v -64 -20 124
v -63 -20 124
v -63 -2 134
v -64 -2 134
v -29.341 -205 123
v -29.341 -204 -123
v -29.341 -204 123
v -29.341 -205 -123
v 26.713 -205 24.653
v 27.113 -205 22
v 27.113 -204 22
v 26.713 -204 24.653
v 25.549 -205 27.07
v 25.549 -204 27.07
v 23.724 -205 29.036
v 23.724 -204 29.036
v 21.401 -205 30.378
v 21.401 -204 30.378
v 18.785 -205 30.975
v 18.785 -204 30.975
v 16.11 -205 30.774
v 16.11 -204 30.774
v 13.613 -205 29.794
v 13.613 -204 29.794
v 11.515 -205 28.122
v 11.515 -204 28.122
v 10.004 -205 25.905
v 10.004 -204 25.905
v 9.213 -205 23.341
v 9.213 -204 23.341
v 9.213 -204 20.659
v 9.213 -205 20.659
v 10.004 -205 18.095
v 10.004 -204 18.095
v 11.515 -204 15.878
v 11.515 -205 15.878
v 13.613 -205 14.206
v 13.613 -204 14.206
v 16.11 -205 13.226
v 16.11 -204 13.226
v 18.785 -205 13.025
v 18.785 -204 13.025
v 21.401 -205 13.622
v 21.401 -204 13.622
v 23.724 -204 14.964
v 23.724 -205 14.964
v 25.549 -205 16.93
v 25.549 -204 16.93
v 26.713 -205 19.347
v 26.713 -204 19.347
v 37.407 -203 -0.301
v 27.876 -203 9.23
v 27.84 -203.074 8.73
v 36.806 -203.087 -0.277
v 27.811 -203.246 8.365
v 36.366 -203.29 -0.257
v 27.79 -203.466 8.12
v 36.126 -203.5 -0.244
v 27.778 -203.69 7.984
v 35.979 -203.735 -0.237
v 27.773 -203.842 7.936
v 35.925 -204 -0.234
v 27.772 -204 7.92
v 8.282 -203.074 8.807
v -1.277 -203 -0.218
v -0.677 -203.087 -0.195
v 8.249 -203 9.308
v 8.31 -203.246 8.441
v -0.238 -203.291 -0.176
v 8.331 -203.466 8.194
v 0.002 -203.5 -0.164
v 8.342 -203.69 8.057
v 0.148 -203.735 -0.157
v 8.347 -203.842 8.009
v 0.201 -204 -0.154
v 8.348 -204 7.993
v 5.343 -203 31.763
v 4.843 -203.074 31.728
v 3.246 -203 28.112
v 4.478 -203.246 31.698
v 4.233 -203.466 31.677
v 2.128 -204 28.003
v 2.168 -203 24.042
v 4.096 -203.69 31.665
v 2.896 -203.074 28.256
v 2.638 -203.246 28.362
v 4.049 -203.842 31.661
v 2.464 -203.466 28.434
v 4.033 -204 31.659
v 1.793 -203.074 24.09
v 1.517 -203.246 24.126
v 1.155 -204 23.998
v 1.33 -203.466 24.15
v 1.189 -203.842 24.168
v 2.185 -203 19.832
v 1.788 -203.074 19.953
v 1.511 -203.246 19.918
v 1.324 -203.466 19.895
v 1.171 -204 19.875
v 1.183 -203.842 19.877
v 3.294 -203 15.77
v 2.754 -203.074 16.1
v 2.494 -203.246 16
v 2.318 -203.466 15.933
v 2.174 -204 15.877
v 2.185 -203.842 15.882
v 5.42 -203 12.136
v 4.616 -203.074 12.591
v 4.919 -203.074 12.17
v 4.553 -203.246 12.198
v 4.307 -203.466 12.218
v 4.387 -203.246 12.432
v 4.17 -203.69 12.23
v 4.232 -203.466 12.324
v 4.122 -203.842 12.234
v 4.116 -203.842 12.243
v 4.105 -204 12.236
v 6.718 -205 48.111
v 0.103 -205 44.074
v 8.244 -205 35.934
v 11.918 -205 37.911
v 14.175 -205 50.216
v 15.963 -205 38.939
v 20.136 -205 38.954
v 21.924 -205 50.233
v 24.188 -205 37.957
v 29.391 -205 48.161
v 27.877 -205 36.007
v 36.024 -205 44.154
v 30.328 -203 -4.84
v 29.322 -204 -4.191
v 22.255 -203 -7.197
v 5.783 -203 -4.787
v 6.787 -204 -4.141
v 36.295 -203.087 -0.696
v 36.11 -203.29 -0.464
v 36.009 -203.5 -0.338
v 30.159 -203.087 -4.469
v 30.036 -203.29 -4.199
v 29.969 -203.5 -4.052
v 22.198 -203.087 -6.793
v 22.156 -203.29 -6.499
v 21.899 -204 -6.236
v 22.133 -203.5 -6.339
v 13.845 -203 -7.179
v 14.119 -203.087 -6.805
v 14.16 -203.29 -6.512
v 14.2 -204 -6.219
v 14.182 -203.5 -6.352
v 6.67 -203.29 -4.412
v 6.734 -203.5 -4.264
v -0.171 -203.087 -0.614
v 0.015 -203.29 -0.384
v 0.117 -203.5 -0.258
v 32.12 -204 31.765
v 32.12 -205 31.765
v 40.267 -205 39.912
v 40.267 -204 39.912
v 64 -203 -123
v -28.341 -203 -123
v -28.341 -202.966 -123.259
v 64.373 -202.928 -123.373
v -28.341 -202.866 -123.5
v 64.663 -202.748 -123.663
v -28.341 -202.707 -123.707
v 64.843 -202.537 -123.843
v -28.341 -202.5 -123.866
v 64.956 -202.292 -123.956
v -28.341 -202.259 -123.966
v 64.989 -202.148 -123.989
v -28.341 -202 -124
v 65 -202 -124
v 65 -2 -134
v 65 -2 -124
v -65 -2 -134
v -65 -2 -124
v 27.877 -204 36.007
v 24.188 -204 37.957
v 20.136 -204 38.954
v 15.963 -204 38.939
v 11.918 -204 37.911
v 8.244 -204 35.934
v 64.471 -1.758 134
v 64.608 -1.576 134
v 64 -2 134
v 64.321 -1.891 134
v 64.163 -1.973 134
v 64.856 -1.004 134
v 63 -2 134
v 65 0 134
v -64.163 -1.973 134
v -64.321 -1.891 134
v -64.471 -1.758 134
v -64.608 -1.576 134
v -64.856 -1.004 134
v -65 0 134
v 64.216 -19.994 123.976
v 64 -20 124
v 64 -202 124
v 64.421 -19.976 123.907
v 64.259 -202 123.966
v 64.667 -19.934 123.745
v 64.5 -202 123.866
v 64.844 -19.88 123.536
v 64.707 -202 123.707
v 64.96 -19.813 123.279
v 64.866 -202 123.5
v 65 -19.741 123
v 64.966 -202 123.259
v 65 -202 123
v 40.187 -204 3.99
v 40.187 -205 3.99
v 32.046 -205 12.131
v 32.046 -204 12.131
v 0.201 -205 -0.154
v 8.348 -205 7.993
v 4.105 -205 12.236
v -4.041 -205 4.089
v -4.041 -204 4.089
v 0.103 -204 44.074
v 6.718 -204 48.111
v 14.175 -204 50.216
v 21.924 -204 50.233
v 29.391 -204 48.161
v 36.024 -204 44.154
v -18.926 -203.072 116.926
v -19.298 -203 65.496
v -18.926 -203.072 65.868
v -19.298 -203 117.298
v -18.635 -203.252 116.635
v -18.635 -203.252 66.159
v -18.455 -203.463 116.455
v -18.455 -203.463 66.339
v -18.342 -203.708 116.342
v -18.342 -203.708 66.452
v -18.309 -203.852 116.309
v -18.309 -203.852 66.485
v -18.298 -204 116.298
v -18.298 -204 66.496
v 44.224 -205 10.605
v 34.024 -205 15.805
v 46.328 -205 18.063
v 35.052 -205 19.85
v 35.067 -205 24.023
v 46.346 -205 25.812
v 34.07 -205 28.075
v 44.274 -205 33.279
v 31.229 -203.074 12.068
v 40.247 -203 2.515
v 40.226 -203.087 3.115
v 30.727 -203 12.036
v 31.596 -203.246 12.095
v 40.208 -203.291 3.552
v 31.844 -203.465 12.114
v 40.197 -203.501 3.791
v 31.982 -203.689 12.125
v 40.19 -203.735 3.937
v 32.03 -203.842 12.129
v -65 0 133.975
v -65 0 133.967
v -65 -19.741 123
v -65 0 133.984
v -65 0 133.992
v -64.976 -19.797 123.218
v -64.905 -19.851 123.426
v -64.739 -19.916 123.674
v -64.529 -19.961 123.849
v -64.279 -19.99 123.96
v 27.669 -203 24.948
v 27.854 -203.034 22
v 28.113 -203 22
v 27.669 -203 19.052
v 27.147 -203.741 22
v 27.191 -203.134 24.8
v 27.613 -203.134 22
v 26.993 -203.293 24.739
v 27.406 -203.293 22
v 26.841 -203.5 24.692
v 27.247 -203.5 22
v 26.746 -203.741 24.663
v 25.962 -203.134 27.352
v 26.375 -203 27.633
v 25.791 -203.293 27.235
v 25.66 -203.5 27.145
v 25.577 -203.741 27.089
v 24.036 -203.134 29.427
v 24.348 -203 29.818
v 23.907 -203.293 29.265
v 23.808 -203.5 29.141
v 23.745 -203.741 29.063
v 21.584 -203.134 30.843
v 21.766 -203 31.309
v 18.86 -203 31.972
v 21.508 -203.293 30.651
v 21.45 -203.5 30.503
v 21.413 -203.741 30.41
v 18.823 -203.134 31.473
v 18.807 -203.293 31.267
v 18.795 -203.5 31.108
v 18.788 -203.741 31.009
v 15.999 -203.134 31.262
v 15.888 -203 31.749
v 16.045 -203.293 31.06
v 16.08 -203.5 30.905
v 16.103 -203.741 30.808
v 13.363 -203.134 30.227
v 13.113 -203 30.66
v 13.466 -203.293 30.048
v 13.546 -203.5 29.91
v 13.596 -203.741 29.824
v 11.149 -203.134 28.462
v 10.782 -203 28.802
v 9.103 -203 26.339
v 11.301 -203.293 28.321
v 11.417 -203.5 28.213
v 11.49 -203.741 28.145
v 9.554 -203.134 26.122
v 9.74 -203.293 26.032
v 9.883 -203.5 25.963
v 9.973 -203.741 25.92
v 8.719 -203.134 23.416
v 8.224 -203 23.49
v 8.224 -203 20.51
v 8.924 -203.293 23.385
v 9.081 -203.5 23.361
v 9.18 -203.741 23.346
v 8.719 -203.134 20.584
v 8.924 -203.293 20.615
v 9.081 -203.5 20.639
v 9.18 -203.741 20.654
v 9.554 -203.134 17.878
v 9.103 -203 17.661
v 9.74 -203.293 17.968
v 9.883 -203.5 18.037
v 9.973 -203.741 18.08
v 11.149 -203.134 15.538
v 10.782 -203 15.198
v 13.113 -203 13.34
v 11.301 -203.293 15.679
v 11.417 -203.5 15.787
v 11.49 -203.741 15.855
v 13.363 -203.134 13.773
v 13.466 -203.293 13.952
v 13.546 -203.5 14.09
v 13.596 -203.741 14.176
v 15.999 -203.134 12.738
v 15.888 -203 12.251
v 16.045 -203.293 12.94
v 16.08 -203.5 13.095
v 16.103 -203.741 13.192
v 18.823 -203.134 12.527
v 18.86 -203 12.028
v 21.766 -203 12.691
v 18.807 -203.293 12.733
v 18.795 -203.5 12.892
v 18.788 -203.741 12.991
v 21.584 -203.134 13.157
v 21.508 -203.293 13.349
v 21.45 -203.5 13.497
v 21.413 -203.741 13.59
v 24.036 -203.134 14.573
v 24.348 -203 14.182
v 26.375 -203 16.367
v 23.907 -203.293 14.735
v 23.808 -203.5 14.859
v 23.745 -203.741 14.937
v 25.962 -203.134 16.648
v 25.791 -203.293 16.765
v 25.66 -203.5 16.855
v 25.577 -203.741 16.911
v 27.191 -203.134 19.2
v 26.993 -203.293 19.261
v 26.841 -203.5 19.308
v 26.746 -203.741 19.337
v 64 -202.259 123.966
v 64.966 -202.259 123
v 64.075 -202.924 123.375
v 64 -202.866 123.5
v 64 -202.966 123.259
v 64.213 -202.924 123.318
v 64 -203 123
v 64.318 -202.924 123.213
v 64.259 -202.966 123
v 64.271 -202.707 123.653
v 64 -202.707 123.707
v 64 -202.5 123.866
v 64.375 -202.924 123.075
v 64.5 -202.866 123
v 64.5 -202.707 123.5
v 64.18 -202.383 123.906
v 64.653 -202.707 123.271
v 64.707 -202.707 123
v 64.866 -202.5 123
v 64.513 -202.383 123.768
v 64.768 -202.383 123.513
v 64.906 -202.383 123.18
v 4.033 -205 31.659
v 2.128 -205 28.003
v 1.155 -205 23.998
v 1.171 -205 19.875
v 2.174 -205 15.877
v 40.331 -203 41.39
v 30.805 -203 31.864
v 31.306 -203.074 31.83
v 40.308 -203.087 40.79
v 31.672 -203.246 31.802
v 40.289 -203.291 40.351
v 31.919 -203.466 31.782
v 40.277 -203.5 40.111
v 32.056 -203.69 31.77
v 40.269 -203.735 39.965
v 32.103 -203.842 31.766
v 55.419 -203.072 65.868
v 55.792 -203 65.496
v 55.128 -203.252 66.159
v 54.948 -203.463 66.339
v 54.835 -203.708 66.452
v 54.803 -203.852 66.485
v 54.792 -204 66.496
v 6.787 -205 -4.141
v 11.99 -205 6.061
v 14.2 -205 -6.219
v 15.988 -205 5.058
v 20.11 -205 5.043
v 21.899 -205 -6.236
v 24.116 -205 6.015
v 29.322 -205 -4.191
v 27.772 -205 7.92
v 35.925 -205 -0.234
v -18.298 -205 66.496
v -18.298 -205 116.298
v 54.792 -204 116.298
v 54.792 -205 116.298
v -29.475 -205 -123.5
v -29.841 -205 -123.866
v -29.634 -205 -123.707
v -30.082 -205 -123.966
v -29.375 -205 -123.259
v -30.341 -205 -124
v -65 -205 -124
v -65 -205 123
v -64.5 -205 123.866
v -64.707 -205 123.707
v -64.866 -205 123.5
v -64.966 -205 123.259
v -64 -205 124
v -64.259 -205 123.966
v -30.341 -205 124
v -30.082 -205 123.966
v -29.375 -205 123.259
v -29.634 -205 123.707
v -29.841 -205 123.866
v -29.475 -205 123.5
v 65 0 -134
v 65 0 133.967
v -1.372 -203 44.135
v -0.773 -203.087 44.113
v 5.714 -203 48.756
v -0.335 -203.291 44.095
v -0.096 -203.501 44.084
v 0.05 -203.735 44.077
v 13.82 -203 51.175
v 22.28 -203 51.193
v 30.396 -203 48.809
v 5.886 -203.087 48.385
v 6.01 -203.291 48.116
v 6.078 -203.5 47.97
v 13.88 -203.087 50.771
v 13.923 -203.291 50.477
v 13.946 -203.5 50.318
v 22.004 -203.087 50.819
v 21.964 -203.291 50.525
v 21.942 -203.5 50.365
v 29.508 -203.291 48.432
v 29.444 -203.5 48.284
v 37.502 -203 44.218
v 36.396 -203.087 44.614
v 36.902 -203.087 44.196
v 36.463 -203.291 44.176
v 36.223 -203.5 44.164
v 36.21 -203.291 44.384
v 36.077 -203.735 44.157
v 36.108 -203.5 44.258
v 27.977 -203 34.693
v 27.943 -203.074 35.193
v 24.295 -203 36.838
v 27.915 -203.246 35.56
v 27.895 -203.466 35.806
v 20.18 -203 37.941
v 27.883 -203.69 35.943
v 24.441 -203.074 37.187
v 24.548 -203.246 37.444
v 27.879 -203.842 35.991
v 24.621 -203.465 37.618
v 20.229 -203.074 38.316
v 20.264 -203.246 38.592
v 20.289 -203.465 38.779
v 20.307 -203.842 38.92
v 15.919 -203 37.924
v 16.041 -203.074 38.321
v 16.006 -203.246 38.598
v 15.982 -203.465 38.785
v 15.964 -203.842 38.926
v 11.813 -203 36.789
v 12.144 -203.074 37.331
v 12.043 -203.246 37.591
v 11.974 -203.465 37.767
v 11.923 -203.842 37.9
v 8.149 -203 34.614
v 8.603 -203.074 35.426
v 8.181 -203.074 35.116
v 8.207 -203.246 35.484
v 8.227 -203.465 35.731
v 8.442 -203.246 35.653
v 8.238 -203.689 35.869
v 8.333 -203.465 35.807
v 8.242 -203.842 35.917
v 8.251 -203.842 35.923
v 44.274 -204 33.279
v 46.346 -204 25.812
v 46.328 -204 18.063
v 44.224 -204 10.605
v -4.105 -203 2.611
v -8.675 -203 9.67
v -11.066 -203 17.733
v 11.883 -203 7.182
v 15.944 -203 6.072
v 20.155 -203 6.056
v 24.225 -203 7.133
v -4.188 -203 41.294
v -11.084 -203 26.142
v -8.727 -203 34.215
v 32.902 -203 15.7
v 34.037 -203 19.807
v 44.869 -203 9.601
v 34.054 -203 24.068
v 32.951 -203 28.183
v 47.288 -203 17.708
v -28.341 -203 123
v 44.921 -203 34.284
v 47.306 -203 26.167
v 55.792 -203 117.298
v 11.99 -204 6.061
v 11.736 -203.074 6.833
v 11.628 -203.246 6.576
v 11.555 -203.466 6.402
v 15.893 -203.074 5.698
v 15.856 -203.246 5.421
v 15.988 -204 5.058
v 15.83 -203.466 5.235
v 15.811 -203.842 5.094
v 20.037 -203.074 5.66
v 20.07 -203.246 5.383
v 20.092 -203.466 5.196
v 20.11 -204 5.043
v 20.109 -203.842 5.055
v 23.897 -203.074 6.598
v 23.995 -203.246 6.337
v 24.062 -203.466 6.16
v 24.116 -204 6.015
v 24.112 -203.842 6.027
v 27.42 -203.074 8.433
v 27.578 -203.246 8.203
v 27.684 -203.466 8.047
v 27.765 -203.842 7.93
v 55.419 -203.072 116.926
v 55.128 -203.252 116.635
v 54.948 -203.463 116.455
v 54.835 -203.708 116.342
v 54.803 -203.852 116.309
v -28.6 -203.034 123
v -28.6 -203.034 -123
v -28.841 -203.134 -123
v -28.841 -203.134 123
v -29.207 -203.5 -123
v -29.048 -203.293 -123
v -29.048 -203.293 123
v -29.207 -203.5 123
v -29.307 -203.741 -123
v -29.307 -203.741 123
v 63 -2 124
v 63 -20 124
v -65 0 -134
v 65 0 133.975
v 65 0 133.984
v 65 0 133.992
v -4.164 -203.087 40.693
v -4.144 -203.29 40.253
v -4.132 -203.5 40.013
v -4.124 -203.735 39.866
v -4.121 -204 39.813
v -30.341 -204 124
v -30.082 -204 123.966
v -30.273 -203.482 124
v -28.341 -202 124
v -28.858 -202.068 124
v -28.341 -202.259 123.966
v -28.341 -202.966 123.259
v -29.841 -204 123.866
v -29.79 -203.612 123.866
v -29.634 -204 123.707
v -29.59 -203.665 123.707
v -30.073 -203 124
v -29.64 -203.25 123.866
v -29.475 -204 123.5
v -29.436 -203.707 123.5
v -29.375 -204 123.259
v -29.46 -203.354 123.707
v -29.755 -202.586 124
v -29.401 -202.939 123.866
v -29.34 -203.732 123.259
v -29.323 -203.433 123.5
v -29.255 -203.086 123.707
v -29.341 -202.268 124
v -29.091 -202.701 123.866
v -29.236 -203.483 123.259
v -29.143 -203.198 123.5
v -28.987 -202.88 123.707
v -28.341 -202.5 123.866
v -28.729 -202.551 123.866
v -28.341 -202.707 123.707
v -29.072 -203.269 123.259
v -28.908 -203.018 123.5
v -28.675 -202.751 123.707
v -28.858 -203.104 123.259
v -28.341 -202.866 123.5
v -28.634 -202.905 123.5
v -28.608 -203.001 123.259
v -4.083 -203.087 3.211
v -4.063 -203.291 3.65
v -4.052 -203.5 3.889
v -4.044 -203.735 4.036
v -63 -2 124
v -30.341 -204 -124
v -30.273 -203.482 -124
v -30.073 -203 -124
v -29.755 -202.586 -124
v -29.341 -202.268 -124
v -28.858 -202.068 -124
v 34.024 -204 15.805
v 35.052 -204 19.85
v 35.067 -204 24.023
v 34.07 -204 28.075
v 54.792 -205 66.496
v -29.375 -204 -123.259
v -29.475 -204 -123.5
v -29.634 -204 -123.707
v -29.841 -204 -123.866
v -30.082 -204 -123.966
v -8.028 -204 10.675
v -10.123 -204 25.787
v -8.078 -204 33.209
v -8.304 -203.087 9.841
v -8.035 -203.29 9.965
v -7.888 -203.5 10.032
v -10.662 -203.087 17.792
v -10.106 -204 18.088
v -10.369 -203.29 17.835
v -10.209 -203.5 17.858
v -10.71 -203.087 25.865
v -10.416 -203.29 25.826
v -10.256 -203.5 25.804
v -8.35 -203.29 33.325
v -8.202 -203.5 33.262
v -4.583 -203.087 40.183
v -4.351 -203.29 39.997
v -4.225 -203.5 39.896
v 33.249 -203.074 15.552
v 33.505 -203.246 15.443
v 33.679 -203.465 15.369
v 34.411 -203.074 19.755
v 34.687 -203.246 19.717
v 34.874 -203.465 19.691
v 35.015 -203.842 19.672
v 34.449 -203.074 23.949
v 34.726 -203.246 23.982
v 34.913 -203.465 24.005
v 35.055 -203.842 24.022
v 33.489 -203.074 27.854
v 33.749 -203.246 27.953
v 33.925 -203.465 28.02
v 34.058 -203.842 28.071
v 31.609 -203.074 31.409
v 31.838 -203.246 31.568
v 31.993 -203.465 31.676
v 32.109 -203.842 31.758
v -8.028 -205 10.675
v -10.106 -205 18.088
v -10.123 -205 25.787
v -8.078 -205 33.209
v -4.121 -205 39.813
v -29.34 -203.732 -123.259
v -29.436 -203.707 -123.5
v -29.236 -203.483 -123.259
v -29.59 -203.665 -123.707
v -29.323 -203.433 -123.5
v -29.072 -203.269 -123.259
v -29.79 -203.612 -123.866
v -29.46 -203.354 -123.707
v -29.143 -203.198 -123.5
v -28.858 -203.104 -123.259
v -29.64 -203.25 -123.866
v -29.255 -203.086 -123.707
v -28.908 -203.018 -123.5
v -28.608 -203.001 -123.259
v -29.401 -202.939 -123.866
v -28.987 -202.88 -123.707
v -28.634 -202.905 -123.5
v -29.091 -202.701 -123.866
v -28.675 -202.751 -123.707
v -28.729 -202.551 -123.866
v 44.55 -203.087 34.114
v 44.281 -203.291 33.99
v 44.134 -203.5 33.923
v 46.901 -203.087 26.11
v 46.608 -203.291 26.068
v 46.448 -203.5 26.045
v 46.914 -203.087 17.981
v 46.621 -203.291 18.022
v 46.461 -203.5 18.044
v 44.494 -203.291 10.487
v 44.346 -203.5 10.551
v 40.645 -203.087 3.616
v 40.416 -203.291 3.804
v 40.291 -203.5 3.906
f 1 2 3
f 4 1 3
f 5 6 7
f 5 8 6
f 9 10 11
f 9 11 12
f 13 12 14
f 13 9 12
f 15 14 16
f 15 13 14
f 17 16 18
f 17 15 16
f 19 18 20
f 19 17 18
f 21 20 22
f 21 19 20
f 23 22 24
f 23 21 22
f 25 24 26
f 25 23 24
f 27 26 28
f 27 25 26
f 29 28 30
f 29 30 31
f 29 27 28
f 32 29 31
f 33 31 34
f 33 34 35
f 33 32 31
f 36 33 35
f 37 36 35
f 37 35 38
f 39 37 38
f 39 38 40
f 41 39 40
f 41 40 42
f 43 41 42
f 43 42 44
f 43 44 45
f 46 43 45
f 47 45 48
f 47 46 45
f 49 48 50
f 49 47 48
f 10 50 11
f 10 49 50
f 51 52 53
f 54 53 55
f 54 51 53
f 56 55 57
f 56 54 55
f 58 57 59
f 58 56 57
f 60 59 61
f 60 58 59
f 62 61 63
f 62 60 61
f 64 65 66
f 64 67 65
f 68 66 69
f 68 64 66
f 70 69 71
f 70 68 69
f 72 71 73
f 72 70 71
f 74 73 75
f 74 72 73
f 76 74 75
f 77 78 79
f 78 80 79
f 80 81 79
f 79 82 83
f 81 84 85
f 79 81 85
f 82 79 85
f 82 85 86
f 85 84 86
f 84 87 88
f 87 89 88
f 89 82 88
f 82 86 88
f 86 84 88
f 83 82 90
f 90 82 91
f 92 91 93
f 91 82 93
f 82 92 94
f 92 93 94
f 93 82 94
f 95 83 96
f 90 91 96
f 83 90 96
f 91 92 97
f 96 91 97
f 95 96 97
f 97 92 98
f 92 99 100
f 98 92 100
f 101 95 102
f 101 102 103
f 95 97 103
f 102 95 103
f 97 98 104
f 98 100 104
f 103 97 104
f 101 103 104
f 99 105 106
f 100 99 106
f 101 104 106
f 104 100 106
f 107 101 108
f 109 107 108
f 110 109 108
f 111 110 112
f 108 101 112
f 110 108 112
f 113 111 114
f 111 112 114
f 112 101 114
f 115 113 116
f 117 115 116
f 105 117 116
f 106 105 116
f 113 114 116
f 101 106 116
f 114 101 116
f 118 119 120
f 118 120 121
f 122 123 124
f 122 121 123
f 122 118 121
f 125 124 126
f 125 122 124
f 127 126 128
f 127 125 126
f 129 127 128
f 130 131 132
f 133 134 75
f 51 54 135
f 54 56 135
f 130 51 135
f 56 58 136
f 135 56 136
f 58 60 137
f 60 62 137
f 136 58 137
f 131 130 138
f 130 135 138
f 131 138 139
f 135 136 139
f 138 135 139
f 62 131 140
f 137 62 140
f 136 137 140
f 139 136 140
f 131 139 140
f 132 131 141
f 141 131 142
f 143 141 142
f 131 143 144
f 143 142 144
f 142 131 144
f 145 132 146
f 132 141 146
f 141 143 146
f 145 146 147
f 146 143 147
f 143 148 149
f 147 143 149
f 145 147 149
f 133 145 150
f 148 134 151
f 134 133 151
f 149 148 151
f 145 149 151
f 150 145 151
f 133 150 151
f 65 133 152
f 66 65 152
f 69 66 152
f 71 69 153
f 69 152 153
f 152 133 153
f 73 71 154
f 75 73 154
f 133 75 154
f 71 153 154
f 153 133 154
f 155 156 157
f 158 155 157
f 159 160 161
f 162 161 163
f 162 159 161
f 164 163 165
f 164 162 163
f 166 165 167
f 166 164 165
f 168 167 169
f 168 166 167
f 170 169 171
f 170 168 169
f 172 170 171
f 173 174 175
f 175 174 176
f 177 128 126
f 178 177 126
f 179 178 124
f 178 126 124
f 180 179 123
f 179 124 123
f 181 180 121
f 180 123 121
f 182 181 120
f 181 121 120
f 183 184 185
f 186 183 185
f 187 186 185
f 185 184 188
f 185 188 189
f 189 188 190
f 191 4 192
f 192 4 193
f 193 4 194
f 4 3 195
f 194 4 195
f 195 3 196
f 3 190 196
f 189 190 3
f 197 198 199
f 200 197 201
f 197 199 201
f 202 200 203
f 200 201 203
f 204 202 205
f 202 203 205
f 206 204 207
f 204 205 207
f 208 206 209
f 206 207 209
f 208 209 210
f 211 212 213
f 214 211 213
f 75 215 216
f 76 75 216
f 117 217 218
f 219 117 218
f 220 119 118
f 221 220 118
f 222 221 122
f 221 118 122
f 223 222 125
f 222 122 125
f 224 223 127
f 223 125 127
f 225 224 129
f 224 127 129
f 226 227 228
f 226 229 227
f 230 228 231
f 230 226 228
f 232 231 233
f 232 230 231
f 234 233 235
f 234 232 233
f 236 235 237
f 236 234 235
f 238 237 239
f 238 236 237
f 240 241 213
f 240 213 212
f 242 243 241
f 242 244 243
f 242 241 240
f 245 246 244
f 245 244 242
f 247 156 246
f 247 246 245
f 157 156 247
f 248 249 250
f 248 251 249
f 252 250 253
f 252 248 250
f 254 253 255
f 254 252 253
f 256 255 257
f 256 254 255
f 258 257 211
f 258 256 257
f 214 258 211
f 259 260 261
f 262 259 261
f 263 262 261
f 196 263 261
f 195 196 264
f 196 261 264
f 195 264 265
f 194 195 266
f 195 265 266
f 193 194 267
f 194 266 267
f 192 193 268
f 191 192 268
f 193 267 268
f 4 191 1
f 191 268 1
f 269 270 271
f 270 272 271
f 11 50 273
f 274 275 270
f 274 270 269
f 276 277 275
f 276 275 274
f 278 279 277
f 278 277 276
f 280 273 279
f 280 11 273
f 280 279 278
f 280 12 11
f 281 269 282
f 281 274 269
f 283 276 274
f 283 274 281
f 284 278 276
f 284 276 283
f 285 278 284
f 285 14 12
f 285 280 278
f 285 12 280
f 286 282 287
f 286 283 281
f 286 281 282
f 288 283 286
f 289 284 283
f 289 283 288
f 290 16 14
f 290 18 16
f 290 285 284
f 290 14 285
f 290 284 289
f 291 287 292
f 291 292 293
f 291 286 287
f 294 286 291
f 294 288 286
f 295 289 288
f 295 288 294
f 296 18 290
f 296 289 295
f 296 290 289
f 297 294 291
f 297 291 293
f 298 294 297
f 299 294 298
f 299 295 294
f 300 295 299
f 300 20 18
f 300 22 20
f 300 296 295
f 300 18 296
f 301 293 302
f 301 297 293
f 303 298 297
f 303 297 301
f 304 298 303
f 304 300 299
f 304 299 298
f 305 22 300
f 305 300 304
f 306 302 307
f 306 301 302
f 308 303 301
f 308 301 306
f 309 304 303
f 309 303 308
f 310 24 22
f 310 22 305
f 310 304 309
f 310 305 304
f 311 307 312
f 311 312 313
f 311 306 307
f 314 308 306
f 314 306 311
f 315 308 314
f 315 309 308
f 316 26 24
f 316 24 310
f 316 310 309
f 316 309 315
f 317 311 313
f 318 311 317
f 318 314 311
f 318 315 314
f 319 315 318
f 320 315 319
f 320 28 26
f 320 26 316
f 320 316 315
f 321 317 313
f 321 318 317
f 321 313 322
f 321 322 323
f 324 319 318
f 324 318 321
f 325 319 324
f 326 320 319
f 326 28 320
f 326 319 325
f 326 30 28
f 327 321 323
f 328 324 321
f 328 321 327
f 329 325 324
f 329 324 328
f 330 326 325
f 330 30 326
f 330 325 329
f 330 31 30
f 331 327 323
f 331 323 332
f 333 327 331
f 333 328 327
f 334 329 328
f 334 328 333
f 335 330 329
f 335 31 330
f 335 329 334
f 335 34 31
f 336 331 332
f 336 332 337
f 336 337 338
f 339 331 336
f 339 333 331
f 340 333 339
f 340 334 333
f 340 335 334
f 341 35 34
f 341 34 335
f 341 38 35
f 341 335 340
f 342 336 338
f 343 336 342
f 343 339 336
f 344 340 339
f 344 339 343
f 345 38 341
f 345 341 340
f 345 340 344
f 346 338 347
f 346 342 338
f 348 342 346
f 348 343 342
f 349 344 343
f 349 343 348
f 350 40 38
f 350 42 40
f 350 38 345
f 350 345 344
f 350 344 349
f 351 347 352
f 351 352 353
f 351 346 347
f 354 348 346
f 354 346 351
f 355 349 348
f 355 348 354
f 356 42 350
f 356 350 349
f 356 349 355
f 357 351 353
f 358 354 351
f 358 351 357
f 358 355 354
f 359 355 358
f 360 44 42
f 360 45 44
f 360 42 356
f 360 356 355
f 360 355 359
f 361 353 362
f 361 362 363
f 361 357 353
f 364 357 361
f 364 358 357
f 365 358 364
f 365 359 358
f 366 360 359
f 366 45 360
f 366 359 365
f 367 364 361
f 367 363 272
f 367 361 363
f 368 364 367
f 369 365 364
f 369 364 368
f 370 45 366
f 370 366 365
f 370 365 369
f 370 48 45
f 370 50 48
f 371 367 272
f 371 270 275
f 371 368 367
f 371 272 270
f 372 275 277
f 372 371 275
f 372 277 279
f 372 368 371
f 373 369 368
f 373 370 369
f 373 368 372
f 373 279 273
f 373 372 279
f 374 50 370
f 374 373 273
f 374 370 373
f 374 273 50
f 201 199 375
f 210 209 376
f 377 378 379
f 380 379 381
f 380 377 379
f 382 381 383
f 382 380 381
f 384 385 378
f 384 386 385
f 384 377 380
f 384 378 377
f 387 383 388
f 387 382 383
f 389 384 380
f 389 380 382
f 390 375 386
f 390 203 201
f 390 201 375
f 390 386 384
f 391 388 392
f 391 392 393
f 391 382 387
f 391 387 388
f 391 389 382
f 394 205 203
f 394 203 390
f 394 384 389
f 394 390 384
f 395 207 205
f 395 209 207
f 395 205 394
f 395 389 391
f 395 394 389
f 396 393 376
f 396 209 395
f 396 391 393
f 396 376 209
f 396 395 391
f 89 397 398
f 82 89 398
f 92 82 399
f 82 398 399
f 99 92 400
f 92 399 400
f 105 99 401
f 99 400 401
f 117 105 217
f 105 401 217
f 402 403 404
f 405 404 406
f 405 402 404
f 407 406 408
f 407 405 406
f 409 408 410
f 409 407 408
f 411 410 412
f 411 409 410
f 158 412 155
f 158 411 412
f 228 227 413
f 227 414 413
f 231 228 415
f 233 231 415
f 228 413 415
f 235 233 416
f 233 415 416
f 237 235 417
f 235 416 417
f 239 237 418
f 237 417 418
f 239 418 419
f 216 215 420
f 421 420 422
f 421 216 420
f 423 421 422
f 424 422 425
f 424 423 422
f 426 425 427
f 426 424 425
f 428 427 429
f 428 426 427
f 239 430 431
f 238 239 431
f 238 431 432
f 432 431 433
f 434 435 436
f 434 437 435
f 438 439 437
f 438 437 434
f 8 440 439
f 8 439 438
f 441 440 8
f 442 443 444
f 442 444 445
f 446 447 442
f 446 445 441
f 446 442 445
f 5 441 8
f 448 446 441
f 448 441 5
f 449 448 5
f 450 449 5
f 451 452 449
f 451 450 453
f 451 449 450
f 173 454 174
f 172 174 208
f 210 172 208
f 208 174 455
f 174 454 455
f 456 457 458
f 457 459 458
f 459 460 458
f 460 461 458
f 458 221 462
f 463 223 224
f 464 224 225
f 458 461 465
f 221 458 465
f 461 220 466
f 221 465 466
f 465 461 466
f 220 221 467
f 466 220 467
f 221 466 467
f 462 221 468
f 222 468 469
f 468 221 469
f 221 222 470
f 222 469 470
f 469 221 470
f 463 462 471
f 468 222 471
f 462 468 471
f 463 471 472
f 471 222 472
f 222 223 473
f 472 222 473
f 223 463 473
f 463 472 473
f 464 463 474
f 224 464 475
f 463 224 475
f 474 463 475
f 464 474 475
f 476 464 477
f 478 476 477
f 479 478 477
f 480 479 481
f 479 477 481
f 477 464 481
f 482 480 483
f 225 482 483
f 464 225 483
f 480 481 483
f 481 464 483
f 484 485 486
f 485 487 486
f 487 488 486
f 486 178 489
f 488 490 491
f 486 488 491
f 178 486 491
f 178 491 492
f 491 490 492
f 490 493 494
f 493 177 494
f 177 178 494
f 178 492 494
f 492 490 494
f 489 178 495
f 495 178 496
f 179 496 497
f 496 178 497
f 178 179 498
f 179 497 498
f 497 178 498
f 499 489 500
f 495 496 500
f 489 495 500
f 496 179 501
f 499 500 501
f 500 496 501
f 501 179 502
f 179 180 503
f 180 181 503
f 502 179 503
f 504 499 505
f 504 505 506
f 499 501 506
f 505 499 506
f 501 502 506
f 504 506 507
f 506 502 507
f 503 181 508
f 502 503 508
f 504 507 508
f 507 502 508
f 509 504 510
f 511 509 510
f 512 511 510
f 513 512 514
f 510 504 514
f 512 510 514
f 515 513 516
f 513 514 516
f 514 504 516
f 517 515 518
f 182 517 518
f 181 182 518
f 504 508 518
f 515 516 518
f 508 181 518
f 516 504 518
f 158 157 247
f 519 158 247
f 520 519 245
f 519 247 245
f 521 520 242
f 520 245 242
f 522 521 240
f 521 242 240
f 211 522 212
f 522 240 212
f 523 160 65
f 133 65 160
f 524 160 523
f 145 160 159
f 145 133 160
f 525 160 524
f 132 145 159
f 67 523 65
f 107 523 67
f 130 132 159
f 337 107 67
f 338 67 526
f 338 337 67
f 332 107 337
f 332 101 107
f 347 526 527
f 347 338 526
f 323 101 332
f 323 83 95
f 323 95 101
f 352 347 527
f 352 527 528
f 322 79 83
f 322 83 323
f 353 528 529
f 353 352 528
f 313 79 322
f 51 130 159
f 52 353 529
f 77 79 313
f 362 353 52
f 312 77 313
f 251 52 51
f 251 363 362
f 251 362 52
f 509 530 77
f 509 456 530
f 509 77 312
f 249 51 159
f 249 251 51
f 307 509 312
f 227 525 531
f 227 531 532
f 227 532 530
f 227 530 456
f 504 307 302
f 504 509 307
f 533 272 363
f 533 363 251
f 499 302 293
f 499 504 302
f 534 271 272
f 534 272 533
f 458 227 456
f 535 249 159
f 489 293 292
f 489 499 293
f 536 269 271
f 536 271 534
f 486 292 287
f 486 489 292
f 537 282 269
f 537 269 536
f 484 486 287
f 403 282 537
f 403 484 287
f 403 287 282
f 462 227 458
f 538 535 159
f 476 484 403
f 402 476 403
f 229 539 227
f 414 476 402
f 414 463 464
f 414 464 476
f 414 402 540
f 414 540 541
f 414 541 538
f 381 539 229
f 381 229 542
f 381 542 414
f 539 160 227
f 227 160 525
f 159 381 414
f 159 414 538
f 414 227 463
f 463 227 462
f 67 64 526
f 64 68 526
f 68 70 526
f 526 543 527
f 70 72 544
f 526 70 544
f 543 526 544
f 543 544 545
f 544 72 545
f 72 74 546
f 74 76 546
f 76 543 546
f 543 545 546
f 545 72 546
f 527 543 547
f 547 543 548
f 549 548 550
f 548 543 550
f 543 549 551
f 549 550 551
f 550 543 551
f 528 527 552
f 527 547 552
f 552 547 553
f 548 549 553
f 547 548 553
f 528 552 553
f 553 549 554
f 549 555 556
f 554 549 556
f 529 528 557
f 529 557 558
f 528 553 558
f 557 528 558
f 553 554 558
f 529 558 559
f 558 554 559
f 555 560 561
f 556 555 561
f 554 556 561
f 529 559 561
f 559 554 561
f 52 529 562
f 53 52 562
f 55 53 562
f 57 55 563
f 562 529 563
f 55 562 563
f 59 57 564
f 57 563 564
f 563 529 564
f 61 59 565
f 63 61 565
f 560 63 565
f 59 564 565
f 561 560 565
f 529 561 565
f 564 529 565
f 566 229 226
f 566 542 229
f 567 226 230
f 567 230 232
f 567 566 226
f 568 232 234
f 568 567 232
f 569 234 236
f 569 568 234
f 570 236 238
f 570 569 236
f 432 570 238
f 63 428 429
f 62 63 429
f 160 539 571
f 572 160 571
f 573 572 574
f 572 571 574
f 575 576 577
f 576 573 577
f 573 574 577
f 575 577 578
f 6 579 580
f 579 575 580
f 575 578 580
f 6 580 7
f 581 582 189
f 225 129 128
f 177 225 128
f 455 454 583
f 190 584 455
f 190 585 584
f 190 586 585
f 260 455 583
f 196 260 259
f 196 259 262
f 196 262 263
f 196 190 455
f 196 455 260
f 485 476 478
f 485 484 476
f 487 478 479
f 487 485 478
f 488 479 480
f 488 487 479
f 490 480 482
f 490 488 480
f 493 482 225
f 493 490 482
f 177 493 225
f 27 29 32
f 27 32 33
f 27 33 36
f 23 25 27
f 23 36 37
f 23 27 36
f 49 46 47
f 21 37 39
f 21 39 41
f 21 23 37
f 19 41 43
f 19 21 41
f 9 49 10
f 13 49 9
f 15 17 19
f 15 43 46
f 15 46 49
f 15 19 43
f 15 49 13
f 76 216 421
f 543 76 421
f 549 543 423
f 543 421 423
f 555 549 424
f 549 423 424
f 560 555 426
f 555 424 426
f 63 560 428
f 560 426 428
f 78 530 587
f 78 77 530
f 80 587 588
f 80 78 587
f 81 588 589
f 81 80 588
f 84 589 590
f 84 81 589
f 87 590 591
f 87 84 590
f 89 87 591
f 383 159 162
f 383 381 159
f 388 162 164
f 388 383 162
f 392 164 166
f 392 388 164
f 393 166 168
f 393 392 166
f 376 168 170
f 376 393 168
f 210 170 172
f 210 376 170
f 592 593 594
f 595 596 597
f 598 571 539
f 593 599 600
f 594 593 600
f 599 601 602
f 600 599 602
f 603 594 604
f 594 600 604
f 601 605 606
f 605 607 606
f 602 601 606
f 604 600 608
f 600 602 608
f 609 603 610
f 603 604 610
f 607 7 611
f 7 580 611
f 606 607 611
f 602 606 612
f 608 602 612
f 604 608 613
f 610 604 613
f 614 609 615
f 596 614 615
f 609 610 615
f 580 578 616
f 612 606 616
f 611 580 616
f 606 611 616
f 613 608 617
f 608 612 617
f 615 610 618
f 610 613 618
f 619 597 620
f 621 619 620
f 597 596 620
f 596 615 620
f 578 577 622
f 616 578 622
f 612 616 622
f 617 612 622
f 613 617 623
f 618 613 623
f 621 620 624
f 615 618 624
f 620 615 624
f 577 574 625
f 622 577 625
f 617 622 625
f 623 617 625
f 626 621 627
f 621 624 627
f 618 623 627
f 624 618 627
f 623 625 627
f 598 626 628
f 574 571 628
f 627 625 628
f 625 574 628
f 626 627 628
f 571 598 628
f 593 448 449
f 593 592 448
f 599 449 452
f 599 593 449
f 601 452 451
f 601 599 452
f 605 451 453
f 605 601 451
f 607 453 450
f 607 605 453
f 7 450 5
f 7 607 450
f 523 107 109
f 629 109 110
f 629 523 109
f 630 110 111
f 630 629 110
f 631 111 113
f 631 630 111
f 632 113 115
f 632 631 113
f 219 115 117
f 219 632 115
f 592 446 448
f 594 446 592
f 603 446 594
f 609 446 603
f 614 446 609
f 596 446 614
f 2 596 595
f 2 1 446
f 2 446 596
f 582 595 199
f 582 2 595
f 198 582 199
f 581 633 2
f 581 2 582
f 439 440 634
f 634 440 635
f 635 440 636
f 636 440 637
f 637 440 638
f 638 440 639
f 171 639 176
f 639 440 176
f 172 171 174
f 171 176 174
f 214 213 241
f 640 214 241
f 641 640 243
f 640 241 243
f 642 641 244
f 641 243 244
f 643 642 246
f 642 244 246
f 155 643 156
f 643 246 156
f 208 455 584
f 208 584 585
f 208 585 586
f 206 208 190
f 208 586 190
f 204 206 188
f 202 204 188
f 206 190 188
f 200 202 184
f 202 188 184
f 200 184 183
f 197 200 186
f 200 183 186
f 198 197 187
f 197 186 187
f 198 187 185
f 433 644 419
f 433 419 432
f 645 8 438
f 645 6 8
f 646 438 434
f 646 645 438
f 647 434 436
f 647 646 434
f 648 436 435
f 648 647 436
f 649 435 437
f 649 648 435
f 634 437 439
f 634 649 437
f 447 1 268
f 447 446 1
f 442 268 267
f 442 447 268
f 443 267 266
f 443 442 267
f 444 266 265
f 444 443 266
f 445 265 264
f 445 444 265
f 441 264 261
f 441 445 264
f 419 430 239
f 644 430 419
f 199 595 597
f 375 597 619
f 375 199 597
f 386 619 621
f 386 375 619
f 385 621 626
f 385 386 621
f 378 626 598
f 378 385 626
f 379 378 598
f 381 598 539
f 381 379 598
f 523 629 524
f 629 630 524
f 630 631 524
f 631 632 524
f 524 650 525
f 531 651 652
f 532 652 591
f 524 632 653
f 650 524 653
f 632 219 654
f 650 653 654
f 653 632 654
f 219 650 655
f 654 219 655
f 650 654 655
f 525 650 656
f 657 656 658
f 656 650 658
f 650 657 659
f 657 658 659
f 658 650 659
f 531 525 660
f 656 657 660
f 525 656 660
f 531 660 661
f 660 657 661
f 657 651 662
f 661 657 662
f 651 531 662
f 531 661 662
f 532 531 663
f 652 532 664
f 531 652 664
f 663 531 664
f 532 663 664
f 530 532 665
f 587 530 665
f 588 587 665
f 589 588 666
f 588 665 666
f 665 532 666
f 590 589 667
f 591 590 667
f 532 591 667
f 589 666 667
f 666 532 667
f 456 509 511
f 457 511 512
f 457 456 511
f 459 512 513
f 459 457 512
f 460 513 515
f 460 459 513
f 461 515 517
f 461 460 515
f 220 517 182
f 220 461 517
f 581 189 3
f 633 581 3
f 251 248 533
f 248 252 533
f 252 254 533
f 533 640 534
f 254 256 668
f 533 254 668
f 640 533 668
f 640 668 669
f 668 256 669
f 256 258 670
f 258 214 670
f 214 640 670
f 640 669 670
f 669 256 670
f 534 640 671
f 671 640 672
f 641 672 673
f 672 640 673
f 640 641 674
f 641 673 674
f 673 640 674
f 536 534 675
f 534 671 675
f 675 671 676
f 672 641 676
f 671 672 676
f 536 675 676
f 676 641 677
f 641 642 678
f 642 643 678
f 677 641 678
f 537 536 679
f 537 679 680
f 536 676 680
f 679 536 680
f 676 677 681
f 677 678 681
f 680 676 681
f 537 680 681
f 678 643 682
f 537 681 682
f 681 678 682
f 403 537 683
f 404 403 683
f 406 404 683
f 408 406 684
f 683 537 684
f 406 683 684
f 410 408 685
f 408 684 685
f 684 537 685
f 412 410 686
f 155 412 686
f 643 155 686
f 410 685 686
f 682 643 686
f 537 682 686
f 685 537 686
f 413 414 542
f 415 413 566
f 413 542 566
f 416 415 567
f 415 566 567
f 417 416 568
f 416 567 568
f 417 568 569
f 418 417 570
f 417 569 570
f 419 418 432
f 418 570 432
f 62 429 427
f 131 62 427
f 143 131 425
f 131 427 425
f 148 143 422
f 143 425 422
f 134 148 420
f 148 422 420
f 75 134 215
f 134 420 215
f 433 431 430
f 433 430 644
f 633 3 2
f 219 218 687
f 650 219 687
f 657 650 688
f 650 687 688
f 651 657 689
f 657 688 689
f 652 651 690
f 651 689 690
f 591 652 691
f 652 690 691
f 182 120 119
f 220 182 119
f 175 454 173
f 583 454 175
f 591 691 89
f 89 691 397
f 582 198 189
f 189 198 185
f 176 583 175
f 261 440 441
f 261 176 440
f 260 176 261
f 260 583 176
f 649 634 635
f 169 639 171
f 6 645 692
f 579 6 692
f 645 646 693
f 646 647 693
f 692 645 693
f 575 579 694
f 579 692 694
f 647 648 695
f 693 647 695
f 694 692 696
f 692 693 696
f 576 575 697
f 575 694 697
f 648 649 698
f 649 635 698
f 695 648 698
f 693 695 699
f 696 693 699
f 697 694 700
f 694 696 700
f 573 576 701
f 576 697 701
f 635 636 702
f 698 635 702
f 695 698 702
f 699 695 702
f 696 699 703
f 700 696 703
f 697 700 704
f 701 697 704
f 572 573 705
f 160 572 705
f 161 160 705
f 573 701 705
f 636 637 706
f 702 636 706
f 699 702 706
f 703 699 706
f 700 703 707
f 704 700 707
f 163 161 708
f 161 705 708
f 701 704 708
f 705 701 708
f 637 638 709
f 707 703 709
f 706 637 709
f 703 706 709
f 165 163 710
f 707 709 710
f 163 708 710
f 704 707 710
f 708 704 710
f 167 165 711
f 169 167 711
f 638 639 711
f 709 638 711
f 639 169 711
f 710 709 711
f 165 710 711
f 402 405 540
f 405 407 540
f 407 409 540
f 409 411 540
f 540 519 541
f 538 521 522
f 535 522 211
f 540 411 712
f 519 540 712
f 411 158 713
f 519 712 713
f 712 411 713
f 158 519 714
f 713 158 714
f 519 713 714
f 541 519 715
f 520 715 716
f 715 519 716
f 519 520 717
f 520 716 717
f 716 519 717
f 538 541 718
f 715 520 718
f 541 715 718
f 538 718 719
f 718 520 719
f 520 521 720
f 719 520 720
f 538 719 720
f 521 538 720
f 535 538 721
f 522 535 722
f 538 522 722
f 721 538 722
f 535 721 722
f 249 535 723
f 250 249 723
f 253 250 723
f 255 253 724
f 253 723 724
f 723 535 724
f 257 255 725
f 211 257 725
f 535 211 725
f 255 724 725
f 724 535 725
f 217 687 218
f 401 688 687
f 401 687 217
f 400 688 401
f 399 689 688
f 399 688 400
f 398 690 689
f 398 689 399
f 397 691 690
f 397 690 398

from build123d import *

# Parameters (mm, degrees)
F0_W      = 130
F0_H      = 248
F1_DEPTH  = 205
F2_W      = 94.3407235295
F2_H      = 248
F2_R      = 9
F2_W_2    = 73.0899348855
F2_H_2    = 49.802608788
F3_DEPTH  = 2
F4_W      = 130
F4_H      = 10
F5_DEPTH  = 20
F7_DEPTH  = 10
F9_DEPTH  = 130.001
F10_F1_R  = 1
F10_F2_R  = 1
F11_DEPTH = 18


with BuildPart() as f1:
    # F0 (on Front) → F1 (new body)
    with BuildSketch(Plane.XZ):
        Rectangle(F0_W, F0_H)
    extrude(amount=F1_DEPTH)

    # F2 (on face) → F3 (cut)
    with BuildSketch(Plane.XZ.offset(205)):
        with Locations((17.8296382353, 0)):
            Rectangle(F2_W, F2_H)
        with BuildLine():
            ThreePointArc((-4.041418053, 4.0888261301), (-10.3760691988, 21.9367014989), (-4.1207936375, 39.8125507927))
            Line((-4.1207936375, 39.8125507927), (4.0327052851, 31.6590518702))
            ThreePointArc((4.0327052851, 31.6590518702), (1.0381912146, 21.9360306033), (4.1054760852, 12.2357202683))
            Line((4.1054760852, 12.2357202683), (-4.041418053, 4.0888261301))
        make_face(mode=Mode.SUBTRACT)
        with BuildLine():
            Line((27.7718433373, 7.9199138179), (35.9253422598, -0.2335851046))
            ThreePointArc((35.9253422598, -0.2335851046), (18.0492121242, -6.4888600406), (0.2011808104, -0.1538563808))
            Line((0.2011808104, -0.1538563808), (8.3480462814, 7.9930090903))
            ThreePointArc((8.3480462814, 7.9930090903), (18.0485383783, 4.9254008127), (27.7718433373, 7.9199138179))
        make_face(mode=Mode.SUBTRACT)
        with Locations((18.1127931993, 22.0000017322)):
            Circle(F2_R, mode=Mode.SUBTRACT)
        with BuildLine():
            ThreePointArc((0.1029558919, 44.0740826376), (18.0492420298, 50.4888635717), (36.0239688015, 44.1542129845))
            Line((36.0239688015, 44.1542129845), (27.8770746633, 36.0073188463))
            ThreePointArc((27.8770746633, 36.0073188463), (18.0486241947, 39.0746029744), (8.2435056862, 35.9335328433))
            Line((8.2435056862, 35.9335328433), (0.1029558919, 44.0740826376))
        make_face(mode=Mode.SUBTRACT)
        with BuildLine():
            ThreePointArc((40.2666513123, 39.9116141211), (46.6016556639, 21.9367314045), (40.1868741048, 3.9901644247))
            Line((40.1868741048, 3.9901644247), (32.0463243105, 12.130714219))
            ThreePointArc((32.0463243105, 12.130714219), (35.1873955054, 21.9361164198), (32.1197858413, 31.7647486501))
            Line((32.1197858413, 31.7647486501), (40.2666513123, 39.9116141211))
        make_face(mode=Mode.SUBTRACT)
        with Locations((18.2467956167, 91.3970731086)):
            Rectangle(F2_W_2, F2_H_2, mode=Mode.SUBTRACT)
    extrude(amount=-F3_DEPTH, mode=Mode.SUBTRACT)

    # F4 (on face) → F5 (join)
    with BuildSketch(Plane(origin=(0, 0, 0), x_dir=(-1, 0, 0), z_dir=(0, 1, 0))):
        with Locations((0, 129)):
            Rectangle(F4_W, F4_H)
        with Locations((0, -129)):
            Rectangle(F4_W, F4_H)
    extrude(amount=-F5_DEPTH)

    # F6 (on face) → F7 (cut, through all)
    with BuildSketch(Plane.XY.offset(134)):
        Polygon((63, -2), (-63, -2), (-63, -20), (63, -20), (63, -18), align=None)
    extrude(amount=-F7_DEPTH, mode=Mode.SUBTRACT)

    # F8 (on face) → F9 (cut, through all)
    with BuildSketch(Plane.YZ.offset(65)):
        Polygon((-20, 134), (-20, 124), (-2, 134), align=None)
    extrude(amount=-F9_DEPTH, mode=Mode.SUBTRACT)

    # F10: fillet of radius 1 on 29 edges, made by hand

    # F10_f1
    f10_f1_edges = [f1.edges().sort_by_distance(p)[0] for p in [
        (-29.3407235295, -203, 0),
        (-0.0440441762, -203, 35.7358013315),
        (1.0381912146, -203, 21.9360306033),
        (0.0320290161, -203, 8.1622731992),
        (-10.3760691988, -203, 21.9367014989),
        (4.2746135459, -203, 3.9195763547),
        (18.0485383783, -203, 4.9254008127),
        (31.8485927986, -203, 3.8431643567),
        (18.0492121242, -203, -6.4888600406),
        (9.1127931993, -203, 22.0000017322),
        (18.0492420298, -203, 50.4888635717),
        (31.9505217324, -203, 40.0807659154),
        (18.0486241947, -203, 39.0746029744),
        (4.173230789, -203, 40.0038077405),
        (36.1932185768, -203, 35.8381813856),
        (46.6016556639, -203, 21.9367314045),
        (36.1165992076, -203, 8.0604393219),
        (35.1873955054, -203, 21.9361164198),
        (18.2467956167, -203, 66.4957687146),
        (-18.2981718261, -203, 91.3970731086),
        (18.2467956167, -203, 116.2983775027),
        (54.7917630594, -203, 91.3970731086),
    ]]
    fillet(f10_f1_edges, radius=F10_F1_R)

    # F10_f2
    f10_f2_edges = [f1.edges().sort_by_distance(p)[0] for p in [
        (-65, -112.5, 124),
        (-65, -11, 129),
        (65, -11, 129),
        (65, -111.5, 124),
        (18.3296382353, -203, 124),
        (18.3296382353, -203, -124),
        (65, -203, 0),
        (-29.0478303106, -203.2928932188, -124),
        (-29.0478303106, -203.2928932188, 124),
    ]]
    fillet(f10_f2_edges, radius=F10_F2_R)

    # F11 (cut): a face of the model
    f11_faces = [f1.faces().sort_by_distance(p)[0] for p in [
        (0, -20, -129),
    ]]
    extrude(f11_faces, amount=-F11_DEPTH, mode=Mode.SUBTRACT)


solid = f1.part
